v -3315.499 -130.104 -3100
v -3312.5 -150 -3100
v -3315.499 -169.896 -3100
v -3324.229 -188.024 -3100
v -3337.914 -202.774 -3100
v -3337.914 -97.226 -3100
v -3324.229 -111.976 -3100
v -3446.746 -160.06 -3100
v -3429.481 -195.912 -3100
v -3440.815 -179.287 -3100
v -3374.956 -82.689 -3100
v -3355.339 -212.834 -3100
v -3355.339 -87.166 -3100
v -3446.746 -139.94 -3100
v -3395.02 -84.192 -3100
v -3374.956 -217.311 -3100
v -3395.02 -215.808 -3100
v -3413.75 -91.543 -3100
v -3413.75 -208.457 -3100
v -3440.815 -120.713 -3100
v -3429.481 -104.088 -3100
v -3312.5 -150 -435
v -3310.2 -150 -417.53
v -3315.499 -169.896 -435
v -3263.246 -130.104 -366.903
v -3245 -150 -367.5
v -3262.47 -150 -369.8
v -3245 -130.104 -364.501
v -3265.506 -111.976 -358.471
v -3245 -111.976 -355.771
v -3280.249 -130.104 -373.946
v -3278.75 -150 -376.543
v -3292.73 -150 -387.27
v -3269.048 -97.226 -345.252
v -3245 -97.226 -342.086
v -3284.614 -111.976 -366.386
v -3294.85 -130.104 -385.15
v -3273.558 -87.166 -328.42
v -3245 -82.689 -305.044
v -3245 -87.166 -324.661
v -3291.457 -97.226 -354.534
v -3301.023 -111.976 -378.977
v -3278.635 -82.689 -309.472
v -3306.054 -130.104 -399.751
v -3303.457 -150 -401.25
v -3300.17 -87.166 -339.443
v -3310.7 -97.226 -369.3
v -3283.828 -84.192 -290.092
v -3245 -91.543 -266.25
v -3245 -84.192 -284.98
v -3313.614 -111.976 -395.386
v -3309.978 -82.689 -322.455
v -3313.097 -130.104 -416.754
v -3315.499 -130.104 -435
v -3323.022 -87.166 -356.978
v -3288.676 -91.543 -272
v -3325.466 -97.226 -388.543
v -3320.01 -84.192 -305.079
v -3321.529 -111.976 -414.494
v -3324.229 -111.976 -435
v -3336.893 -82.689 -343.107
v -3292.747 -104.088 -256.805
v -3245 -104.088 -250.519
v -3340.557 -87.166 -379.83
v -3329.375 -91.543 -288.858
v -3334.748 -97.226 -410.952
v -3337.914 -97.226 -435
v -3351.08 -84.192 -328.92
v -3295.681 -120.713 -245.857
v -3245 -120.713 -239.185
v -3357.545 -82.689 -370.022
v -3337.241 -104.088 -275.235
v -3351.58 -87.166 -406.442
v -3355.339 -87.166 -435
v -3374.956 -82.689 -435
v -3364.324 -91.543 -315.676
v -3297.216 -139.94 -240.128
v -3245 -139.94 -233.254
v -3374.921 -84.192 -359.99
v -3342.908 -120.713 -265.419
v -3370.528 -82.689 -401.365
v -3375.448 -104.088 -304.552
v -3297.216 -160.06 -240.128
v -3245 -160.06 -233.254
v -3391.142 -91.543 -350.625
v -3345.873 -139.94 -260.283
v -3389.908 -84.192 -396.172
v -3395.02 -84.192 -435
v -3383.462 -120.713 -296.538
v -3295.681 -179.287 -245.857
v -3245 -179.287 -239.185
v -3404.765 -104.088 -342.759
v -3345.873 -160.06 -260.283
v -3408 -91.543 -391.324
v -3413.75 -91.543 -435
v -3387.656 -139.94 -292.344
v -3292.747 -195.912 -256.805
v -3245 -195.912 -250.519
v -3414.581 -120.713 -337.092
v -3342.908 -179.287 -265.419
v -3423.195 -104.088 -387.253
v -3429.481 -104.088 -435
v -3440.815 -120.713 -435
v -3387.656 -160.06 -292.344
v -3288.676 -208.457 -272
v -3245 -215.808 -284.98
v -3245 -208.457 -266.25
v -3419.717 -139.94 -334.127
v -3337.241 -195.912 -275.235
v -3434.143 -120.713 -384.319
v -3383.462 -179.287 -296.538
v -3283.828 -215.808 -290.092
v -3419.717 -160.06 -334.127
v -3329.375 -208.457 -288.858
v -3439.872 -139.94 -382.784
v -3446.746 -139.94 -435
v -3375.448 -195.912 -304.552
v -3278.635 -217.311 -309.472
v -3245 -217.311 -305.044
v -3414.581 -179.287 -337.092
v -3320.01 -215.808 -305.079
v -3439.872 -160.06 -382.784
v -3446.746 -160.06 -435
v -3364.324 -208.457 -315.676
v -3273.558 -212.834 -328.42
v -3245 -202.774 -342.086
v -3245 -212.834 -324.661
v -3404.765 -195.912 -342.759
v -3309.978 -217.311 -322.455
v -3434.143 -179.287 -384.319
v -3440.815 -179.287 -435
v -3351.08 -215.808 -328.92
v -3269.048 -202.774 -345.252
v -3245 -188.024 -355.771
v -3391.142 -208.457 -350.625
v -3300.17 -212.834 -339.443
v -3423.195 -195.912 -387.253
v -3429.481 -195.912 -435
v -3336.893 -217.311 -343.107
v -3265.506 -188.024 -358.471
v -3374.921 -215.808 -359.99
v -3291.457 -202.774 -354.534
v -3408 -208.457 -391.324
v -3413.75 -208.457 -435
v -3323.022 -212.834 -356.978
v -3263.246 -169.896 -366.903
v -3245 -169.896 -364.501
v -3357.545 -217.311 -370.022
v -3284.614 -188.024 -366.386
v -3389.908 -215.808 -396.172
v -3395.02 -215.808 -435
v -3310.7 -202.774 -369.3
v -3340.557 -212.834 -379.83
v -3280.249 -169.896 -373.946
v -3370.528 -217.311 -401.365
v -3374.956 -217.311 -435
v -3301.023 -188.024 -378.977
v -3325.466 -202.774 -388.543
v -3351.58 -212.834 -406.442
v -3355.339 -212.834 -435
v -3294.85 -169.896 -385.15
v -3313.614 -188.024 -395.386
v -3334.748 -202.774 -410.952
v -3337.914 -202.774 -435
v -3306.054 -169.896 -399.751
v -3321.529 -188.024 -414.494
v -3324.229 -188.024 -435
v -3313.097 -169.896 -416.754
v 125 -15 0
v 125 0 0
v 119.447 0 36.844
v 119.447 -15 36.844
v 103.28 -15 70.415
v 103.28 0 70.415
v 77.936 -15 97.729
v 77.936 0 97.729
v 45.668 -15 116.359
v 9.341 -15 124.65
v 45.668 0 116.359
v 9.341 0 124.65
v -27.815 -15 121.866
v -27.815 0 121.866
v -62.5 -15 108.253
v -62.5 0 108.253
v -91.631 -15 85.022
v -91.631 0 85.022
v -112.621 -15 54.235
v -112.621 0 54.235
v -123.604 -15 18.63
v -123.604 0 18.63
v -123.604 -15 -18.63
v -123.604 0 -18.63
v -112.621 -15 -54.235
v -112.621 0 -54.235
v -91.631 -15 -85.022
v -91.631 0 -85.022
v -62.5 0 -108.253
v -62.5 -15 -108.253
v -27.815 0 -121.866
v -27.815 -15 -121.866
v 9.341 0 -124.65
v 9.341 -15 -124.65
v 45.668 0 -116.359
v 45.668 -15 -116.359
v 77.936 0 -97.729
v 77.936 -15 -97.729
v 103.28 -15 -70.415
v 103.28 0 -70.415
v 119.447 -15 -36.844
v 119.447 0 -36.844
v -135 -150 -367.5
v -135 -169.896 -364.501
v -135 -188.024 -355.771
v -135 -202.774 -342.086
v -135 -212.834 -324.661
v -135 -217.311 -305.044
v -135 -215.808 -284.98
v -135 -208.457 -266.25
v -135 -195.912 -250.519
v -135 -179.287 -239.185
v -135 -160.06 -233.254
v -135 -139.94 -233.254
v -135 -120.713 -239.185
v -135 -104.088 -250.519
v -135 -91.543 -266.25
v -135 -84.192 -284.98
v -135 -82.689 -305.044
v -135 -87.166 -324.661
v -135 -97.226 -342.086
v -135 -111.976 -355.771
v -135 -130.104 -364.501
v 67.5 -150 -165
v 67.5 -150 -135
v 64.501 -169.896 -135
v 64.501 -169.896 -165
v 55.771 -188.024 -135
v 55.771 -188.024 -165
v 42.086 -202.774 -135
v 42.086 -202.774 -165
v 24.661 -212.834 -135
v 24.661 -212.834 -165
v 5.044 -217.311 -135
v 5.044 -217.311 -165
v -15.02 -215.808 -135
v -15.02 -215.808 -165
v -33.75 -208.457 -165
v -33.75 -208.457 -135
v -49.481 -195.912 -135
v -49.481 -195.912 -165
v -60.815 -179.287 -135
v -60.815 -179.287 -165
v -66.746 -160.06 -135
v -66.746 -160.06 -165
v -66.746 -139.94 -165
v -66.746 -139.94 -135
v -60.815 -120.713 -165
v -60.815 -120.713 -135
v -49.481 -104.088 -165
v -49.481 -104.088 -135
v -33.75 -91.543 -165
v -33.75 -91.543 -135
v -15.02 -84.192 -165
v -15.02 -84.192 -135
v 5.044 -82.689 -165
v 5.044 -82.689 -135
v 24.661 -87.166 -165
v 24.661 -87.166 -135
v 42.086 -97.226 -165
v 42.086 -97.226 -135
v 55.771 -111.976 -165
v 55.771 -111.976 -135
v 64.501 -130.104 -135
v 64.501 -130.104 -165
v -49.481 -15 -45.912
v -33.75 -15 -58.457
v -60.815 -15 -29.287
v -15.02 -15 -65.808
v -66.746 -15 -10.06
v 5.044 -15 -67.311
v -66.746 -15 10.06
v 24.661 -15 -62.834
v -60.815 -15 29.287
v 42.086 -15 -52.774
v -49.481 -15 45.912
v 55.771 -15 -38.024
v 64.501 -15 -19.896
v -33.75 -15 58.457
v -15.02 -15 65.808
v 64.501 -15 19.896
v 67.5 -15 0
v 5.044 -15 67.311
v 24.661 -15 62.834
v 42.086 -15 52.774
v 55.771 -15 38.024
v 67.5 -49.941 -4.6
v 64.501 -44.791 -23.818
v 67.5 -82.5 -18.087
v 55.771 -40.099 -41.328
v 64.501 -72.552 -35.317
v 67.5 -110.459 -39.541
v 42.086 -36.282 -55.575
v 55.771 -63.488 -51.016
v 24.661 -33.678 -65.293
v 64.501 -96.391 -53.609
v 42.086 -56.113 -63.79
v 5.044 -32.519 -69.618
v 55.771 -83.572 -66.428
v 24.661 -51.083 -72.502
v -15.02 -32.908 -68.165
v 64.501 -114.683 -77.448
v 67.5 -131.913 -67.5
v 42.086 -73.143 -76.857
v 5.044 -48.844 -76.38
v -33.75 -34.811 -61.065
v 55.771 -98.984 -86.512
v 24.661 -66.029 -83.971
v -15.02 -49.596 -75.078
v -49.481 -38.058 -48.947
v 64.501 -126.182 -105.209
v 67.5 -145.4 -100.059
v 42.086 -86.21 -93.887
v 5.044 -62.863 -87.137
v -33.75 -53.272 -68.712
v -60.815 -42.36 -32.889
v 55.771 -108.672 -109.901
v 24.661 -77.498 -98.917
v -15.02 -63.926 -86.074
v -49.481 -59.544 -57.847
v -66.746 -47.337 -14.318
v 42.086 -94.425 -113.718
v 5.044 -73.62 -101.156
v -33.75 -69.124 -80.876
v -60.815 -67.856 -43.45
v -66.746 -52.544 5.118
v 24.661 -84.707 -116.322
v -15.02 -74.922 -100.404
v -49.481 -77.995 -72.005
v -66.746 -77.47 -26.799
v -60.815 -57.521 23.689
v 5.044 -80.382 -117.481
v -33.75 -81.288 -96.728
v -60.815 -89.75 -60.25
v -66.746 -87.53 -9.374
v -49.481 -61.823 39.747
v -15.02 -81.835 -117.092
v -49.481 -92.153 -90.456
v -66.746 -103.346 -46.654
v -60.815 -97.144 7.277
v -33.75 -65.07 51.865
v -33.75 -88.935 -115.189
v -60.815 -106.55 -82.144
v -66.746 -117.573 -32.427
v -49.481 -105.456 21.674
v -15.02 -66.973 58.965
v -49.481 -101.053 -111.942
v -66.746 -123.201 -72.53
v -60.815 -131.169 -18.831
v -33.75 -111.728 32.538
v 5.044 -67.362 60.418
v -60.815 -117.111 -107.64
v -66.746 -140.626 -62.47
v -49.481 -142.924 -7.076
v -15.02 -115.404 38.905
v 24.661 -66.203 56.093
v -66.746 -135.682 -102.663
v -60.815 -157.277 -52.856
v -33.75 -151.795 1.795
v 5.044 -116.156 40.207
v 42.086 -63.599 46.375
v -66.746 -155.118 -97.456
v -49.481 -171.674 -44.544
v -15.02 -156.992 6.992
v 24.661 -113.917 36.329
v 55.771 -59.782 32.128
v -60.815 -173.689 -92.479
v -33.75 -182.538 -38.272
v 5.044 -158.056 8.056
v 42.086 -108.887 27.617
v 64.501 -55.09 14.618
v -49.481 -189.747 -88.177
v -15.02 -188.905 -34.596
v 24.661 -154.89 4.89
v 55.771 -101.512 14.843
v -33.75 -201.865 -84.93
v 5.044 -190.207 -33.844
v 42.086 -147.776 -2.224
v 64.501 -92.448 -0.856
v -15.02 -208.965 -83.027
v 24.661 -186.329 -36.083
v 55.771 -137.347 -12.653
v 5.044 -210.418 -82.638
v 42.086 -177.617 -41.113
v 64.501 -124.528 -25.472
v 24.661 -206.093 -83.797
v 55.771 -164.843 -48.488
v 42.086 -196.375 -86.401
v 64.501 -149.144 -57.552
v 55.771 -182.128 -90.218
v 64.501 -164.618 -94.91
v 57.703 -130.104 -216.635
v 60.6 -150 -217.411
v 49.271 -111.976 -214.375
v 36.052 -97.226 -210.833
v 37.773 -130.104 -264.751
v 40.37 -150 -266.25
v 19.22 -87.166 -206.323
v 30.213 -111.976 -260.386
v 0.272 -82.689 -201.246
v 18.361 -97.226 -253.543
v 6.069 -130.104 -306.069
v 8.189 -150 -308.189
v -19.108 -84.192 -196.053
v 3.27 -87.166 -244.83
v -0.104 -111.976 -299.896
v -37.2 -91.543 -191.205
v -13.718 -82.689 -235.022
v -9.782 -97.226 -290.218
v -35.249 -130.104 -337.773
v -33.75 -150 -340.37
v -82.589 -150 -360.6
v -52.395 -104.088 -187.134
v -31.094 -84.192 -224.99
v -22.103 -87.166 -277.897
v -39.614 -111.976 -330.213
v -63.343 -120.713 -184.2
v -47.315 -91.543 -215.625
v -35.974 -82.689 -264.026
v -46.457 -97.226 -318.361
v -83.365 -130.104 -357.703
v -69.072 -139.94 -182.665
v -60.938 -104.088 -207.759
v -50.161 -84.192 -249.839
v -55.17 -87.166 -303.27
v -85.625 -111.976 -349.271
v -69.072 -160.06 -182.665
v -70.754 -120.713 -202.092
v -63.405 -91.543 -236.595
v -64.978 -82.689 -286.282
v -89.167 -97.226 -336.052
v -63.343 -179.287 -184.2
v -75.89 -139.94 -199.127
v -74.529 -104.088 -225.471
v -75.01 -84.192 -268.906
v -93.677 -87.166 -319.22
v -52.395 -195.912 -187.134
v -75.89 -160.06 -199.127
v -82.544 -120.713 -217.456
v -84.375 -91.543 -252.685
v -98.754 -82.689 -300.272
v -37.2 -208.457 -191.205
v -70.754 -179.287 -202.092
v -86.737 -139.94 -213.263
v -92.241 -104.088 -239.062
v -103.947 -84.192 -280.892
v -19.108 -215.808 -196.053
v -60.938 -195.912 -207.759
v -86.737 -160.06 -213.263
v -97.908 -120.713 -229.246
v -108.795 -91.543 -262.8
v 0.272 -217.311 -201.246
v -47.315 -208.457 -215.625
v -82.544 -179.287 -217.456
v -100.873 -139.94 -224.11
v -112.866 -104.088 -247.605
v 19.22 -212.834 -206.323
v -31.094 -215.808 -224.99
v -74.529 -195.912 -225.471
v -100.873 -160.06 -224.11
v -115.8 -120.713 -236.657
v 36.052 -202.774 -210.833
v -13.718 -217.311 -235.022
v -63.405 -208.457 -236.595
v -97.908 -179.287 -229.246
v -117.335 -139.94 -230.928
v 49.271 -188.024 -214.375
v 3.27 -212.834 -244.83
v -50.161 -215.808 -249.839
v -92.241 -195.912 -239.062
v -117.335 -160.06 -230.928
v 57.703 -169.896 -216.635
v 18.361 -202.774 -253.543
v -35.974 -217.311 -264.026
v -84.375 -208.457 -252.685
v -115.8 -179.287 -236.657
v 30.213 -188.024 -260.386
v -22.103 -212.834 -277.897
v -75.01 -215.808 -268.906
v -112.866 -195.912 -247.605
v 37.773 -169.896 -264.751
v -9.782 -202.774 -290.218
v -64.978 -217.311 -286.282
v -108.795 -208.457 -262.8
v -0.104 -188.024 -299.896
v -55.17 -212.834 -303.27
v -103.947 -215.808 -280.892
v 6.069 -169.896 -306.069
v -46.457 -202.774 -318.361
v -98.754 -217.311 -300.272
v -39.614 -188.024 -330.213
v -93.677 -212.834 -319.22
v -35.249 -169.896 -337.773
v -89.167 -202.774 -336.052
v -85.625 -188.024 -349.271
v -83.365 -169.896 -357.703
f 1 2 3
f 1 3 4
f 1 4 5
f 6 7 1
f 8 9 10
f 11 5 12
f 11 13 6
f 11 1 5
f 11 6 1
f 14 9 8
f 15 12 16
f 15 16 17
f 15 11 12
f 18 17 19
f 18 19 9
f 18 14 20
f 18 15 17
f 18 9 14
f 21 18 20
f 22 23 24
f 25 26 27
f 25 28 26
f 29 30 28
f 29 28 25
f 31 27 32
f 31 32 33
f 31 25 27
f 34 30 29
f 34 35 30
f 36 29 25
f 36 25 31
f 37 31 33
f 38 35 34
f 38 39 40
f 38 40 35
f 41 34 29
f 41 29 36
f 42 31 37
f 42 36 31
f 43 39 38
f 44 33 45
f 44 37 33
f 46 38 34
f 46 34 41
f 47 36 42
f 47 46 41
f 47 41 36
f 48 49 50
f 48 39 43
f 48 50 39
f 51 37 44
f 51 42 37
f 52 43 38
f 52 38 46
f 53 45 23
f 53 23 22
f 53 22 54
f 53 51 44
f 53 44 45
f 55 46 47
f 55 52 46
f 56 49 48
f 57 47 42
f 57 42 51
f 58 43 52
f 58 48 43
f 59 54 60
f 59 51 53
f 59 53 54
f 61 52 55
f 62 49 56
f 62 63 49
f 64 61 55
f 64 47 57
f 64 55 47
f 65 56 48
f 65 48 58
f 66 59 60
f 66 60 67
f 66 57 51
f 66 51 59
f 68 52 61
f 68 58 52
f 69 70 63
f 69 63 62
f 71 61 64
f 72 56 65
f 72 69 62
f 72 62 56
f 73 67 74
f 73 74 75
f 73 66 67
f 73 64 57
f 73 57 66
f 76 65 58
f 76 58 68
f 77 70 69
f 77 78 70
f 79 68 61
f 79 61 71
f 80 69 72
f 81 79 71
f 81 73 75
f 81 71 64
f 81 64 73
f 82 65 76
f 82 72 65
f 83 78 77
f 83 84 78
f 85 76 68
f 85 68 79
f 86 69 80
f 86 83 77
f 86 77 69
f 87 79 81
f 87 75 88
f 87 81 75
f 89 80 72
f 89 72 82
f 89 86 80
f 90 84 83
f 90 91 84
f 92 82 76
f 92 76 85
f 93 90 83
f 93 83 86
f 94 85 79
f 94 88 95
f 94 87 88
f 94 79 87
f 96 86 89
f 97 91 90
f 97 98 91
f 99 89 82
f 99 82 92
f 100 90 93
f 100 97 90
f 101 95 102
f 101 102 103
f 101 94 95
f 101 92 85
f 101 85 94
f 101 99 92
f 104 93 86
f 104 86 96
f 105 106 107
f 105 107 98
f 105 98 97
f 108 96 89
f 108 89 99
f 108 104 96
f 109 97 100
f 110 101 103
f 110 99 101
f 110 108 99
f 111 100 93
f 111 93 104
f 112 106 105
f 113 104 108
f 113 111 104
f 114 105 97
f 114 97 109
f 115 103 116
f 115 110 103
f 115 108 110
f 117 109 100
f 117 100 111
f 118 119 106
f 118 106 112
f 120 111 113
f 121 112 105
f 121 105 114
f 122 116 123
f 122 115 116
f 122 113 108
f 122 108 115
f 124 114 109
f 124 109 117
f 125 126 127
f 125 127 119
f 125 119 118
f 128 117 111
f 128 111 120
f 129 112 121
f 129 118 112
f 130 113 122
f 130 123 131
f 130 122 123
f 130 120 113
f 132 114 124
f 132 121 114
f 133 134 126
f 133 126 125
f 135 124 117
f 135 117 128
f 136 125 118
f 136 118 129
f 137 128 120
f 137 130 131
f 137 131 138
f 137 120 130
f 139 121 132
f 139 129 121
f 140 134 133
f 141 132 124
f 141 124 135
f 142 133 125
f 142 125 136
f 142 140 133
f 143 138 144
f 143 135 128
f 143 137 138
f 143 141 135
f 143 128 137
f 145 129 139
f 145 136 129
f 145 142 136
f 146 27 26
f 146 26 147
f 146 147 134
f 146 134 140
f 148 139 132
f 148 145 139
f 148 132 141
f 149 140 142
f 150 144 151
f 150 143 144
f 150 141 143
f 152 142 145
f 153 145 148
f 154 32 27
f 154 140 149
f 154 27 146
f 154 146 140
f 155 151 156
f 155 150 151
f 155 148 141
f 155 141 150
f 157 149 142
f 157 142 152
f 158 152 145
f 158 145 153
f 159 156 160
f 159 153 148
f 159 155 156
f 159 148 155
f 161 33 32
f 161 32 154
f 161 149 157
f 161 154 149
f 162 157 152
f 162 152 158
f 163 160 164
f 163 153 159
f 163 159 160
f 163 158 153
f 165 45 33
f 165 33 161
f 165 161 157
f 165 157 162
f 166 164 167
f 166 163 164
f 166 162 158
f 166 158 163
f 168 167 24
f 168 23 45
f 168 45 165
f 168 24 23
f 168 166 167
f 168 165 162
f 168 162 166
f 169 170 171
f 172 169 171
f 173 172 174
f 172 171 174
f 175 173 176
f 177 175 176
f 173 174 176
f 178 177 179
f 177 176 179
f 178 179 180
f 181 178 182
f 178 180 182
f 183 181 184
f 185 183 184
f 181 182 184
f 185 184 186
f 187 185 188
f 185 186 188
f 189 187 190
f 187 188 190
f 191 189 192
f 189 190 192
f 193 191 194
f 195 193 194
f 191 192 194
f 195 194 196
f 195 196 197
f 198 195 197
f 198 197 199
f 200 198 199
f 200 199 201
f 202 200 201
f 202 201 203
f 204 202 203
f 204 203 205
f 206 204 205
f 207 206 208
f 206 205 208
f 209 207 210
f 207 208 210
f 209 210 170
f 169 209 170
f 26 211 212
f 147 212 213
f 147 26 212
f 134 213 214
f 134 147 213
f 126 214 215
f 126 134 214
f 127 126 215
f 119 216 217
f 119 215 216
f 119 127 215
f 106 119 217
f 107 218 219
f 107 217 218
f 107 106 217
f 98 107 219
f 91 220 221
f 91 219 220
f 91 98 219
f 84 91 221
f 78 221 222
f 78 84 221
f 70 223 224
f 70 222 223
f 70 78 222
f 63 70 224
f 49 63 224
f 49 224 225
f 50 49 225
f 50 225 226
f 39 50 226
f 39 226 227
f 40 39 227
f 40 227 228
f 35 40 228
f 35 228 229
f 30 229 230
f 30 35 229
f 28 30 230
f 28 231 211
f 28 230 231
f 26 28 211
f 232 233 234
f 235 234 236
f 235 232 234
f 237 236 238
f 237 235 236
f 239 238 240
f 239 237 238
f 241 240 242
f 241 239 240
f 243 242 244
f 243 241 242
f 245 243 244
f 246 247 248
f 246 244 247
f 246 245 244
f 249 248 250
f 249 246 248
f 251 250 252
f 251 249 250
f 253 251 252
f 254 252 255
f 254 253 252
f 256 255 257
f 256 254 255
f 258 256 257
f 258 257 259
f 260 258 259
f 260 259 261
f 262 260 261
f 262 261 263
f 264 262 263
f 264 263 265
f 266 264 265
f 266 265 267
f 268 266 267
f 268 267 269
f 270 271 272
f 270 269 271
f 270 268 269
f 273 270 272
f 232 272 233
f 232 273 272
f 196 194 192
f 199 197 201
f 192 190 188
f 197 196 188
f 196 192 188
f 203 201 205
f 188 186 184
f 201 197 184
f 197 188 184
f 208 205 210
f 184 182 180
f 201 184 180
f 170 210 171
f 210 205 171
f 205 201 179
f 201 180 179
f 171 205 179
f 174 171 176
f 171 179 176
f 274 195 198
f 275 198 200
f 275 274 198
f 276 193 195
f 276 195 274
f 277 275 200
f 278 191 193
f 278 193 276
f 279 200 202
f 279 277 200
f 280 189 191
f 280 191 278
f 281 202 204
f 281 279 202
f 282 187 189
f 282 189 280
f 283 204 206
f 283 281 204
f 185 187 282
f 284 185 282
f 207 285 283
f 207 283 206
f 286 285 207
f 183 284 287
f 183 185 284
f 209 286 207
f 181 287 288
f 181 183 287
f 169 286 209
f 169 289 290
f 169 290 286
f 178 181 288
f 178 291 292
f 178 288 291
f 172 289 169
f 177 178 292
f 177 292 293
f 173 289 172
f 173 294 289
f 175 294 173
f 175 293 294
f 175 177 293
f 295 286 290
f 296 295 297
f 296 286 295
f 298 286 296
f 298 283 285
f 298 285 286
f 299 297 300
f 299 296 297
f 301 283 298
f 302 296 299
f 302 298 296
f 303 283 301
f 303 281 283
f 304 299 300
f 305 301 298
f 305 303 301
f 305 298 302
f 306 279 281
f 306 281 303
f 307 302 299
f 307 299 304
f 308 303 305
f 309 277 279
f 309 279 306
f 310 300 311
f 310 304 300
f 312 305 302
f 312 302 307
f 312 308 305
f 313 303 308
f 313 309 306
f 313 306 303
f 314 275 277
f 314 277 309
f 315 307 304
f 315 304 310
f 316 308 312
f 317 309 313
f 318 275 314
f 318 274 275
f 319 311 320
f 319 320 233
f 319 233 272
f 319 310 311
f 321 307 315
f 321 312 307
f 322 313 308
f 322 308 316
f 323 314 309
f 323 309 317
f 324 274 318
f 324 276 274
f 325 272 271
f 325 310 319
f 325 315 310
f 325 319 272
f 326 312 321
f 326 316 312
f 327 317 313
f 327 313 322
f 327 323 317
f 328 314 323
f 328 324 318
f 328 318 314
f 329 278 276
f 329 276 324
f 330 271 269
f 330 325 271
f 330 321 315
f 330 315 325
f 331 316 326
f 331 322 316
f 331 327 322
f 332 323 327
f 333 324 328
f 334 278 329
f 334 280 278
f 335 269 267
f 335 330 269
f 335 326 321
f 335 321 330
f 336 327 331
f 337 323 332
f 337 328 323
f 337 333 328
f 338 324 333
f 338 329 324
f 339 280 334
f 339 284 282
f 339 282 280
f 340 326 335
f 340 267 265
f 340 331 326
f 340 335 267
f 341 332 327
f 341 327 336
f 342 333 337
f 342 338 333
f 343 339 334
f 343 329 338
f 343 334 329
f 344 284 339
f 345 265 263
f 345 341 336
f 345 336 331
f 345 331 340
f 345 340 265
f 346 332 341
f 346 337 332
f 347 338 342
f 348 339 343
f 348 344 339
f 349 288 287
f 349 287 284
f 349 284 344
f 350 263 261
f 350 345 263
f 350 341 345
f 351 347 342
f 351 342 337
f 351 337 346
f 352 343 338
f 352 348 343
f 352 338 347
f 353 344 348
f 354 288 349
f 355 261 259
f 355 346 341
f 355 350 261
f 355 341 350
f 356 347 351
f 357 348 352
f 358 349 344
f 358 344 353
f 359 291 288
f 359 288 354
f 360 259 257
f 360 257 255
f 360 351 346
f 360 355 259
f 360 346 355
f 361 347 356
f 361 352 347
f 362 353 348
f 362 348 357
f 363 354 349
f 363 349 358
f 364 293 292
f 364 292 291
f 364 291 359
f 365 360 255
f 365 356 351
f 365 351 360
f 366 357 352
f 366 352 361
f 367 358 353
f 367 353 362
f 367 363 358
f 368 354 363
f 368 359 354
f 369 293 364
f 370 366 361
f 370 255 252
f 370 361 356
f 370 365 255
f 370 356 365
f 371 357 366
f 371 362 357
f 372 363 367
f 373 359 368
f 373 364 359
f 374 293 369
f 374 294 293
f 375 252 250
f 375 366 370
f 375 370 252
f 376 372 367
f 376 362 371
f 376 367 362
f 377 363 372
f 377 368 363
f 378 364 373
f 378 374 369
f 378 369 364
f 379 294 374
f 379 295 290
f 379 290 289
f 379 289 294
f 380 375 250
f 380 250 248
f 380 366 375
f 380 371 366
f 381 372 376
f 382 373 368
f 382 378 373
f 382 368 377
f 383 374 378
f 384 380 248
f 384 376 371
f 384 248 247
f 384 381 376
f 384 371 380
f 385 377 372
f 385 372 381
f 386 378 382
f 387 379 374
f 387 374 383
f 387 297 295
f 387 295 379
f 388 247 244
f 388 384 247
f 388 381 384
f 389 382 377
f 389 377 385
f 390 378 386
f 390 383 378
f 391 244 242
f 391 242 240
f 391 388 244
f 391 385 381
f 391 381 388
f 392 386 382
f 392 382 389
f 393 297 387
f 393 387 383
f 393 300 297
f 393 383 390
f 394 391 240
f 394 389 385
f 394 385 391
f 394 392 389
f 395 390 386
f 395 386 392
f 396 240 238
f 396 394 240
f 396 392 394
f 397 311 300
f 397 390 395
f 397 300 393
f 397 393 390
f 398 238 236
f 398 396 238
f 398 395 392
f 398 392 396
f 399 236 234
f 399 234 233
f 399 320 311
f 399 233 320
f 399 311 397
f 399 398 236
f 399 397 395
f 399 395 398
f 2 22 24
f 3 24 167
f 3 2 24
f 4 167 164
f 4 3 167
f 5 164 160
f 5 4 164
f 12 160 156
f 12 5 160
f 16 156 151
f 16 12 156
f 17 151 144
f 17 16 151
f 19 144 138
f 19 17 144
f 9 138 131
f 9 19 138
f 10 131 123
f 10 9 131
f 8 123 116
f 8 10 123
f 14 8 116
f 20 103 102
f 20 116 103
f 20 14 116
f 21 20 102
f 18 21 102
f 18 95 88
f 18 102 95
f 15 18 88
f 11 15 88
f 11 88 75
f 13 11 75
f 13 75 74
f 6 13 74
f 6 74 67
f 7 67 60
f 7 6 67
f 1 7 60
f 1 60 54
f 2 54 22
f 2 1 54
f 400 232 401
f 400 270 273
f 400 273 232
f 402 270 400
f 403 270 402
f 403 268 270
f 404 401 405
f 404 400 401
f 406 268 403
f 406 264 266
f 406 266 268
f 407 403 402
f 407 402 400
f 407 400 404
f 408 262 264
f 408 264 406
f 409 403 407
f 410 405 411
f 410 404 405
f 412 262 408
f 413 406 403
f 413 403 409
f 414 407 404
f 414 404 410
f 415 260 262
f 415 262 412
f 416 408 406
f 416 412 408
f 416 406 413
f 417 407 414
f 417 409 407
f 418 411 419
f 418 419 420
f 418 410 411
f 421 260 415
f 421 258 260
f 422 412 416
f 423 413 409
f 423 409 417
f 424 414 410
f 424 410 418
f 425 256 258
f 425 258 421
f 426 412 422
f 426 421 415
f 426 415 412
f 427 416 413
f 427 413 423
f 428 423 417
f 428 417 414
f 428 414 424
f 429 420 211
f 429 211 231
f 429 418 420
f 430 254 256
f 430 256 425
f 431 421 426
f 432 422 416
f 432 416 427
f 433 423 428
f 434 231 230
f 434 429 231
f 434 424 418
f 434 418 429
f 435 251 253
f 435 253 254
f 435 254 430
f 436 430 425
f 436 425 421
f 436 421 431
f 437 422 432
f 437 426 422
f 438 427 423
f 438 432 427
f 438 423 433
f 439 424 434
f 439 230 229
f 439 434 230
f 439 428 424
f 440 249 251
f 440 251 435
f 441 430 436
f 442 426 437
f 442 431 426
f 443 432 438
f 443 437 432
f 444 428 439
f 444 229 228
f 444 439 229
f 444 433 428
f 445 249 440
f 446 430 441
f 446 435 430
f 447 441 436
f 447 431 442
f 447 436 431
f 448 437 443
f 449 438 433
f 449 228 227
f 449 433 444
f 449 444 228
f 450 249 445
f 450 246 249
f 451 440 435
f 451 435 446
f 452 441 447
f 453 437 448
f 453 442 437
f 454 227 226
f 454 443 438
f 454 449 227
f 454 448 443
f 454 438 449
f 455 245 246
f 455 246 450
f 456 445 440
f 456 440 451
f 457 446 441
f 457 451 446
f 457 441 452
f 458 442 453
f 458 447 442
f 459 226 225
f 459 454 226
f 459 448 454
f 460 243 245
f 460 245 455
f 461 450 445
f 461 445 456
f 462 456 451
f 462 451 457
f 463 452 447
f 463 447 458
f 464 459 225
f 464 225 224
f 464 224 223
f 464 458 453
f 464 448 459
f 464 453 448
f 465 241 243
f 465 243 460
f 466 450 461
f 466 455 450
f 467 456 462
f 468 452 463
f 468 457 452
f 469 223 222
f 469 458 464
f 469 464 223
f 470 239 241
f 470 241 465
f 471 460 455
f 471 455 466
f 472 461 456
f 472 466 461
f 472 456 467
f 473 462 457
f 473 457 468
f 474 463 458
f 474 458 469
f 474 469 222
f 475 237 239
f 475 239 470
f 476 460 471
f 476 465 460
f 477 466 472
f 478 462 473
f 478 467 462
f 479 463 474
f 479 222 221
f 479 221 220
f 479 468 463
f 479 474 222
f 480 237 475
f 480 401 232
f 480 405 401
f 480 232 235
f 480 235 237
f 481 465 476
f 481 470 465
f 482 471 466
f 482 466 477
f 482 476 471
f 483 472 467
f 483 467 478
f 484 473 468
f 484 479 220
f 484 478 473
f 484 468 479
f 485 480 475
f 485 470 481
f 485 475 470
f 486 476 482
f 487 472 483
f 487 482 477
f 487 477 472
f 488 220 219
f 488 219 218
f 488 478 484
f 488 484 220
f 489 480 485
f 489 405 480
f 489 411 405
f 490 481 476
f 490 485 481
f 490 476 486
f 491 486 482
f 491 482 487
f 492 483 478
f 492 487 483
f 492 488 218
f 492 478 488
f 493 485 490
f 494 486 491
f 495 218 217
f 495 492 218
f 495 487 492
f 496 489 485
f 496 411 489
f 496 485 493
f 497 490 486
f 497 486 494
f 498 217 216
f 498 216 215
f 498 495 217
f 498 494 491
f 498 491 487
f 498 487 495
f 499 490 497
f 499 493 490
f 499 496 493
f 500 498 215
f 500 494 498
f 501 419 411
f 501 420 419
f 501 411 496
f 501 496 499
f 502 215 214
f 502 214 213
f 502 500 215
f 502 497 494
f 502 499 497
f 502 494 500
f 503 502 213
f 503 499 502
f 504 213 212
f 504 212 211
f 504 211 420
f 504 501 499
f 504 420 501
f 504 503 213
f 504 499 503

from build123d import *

# Parameters (mm, degrees)
F0_R     = 67.5
F0_R_2   = 125
F5_DEPTH = 15


with BuildPart() as f4:
    # F4: sweep along a path in F1, F3
    with BuildLine(Plane.YZ) as f4_path:
        Line((0, 0), (-15, 0))
        ThreePointArc((-15, 0), (-110.4594154602, -39.5405845398), (-150, -135))
    with BuildLine(Plane.XZ.offset(150)) as f4_path_2:
        Line((0, -135), (0, -150))
        Line((0, -150), (0, -165))
        ThreePointArc((0, -165), (-39.5405845398, -260.4594154602), (-135, -300))
        Line((-135, -300), (-3245, -300))
        ThreePointArc((-3245, -300), (-3340.4594154602, -339.5405845398), (-3380, -435))
        Line((-3380, -435), (-3380, -3100))
    # F0 (on Front) → F4 (sweep)
    with BuildSketch(Plane.XZ):
        Circle(F0_R)
    sweep(path=f4_path.line + f4_path_2.line)

    # F0 (on Front) → F5 (join)
    with BuildSketch(Plane.XZ):
        Circle(F0_R_2)
        Circle(F0_R, mode=Mode.SUBTRACT)
    extrude(amount=F5_DEPTH)


solid = f4.part
